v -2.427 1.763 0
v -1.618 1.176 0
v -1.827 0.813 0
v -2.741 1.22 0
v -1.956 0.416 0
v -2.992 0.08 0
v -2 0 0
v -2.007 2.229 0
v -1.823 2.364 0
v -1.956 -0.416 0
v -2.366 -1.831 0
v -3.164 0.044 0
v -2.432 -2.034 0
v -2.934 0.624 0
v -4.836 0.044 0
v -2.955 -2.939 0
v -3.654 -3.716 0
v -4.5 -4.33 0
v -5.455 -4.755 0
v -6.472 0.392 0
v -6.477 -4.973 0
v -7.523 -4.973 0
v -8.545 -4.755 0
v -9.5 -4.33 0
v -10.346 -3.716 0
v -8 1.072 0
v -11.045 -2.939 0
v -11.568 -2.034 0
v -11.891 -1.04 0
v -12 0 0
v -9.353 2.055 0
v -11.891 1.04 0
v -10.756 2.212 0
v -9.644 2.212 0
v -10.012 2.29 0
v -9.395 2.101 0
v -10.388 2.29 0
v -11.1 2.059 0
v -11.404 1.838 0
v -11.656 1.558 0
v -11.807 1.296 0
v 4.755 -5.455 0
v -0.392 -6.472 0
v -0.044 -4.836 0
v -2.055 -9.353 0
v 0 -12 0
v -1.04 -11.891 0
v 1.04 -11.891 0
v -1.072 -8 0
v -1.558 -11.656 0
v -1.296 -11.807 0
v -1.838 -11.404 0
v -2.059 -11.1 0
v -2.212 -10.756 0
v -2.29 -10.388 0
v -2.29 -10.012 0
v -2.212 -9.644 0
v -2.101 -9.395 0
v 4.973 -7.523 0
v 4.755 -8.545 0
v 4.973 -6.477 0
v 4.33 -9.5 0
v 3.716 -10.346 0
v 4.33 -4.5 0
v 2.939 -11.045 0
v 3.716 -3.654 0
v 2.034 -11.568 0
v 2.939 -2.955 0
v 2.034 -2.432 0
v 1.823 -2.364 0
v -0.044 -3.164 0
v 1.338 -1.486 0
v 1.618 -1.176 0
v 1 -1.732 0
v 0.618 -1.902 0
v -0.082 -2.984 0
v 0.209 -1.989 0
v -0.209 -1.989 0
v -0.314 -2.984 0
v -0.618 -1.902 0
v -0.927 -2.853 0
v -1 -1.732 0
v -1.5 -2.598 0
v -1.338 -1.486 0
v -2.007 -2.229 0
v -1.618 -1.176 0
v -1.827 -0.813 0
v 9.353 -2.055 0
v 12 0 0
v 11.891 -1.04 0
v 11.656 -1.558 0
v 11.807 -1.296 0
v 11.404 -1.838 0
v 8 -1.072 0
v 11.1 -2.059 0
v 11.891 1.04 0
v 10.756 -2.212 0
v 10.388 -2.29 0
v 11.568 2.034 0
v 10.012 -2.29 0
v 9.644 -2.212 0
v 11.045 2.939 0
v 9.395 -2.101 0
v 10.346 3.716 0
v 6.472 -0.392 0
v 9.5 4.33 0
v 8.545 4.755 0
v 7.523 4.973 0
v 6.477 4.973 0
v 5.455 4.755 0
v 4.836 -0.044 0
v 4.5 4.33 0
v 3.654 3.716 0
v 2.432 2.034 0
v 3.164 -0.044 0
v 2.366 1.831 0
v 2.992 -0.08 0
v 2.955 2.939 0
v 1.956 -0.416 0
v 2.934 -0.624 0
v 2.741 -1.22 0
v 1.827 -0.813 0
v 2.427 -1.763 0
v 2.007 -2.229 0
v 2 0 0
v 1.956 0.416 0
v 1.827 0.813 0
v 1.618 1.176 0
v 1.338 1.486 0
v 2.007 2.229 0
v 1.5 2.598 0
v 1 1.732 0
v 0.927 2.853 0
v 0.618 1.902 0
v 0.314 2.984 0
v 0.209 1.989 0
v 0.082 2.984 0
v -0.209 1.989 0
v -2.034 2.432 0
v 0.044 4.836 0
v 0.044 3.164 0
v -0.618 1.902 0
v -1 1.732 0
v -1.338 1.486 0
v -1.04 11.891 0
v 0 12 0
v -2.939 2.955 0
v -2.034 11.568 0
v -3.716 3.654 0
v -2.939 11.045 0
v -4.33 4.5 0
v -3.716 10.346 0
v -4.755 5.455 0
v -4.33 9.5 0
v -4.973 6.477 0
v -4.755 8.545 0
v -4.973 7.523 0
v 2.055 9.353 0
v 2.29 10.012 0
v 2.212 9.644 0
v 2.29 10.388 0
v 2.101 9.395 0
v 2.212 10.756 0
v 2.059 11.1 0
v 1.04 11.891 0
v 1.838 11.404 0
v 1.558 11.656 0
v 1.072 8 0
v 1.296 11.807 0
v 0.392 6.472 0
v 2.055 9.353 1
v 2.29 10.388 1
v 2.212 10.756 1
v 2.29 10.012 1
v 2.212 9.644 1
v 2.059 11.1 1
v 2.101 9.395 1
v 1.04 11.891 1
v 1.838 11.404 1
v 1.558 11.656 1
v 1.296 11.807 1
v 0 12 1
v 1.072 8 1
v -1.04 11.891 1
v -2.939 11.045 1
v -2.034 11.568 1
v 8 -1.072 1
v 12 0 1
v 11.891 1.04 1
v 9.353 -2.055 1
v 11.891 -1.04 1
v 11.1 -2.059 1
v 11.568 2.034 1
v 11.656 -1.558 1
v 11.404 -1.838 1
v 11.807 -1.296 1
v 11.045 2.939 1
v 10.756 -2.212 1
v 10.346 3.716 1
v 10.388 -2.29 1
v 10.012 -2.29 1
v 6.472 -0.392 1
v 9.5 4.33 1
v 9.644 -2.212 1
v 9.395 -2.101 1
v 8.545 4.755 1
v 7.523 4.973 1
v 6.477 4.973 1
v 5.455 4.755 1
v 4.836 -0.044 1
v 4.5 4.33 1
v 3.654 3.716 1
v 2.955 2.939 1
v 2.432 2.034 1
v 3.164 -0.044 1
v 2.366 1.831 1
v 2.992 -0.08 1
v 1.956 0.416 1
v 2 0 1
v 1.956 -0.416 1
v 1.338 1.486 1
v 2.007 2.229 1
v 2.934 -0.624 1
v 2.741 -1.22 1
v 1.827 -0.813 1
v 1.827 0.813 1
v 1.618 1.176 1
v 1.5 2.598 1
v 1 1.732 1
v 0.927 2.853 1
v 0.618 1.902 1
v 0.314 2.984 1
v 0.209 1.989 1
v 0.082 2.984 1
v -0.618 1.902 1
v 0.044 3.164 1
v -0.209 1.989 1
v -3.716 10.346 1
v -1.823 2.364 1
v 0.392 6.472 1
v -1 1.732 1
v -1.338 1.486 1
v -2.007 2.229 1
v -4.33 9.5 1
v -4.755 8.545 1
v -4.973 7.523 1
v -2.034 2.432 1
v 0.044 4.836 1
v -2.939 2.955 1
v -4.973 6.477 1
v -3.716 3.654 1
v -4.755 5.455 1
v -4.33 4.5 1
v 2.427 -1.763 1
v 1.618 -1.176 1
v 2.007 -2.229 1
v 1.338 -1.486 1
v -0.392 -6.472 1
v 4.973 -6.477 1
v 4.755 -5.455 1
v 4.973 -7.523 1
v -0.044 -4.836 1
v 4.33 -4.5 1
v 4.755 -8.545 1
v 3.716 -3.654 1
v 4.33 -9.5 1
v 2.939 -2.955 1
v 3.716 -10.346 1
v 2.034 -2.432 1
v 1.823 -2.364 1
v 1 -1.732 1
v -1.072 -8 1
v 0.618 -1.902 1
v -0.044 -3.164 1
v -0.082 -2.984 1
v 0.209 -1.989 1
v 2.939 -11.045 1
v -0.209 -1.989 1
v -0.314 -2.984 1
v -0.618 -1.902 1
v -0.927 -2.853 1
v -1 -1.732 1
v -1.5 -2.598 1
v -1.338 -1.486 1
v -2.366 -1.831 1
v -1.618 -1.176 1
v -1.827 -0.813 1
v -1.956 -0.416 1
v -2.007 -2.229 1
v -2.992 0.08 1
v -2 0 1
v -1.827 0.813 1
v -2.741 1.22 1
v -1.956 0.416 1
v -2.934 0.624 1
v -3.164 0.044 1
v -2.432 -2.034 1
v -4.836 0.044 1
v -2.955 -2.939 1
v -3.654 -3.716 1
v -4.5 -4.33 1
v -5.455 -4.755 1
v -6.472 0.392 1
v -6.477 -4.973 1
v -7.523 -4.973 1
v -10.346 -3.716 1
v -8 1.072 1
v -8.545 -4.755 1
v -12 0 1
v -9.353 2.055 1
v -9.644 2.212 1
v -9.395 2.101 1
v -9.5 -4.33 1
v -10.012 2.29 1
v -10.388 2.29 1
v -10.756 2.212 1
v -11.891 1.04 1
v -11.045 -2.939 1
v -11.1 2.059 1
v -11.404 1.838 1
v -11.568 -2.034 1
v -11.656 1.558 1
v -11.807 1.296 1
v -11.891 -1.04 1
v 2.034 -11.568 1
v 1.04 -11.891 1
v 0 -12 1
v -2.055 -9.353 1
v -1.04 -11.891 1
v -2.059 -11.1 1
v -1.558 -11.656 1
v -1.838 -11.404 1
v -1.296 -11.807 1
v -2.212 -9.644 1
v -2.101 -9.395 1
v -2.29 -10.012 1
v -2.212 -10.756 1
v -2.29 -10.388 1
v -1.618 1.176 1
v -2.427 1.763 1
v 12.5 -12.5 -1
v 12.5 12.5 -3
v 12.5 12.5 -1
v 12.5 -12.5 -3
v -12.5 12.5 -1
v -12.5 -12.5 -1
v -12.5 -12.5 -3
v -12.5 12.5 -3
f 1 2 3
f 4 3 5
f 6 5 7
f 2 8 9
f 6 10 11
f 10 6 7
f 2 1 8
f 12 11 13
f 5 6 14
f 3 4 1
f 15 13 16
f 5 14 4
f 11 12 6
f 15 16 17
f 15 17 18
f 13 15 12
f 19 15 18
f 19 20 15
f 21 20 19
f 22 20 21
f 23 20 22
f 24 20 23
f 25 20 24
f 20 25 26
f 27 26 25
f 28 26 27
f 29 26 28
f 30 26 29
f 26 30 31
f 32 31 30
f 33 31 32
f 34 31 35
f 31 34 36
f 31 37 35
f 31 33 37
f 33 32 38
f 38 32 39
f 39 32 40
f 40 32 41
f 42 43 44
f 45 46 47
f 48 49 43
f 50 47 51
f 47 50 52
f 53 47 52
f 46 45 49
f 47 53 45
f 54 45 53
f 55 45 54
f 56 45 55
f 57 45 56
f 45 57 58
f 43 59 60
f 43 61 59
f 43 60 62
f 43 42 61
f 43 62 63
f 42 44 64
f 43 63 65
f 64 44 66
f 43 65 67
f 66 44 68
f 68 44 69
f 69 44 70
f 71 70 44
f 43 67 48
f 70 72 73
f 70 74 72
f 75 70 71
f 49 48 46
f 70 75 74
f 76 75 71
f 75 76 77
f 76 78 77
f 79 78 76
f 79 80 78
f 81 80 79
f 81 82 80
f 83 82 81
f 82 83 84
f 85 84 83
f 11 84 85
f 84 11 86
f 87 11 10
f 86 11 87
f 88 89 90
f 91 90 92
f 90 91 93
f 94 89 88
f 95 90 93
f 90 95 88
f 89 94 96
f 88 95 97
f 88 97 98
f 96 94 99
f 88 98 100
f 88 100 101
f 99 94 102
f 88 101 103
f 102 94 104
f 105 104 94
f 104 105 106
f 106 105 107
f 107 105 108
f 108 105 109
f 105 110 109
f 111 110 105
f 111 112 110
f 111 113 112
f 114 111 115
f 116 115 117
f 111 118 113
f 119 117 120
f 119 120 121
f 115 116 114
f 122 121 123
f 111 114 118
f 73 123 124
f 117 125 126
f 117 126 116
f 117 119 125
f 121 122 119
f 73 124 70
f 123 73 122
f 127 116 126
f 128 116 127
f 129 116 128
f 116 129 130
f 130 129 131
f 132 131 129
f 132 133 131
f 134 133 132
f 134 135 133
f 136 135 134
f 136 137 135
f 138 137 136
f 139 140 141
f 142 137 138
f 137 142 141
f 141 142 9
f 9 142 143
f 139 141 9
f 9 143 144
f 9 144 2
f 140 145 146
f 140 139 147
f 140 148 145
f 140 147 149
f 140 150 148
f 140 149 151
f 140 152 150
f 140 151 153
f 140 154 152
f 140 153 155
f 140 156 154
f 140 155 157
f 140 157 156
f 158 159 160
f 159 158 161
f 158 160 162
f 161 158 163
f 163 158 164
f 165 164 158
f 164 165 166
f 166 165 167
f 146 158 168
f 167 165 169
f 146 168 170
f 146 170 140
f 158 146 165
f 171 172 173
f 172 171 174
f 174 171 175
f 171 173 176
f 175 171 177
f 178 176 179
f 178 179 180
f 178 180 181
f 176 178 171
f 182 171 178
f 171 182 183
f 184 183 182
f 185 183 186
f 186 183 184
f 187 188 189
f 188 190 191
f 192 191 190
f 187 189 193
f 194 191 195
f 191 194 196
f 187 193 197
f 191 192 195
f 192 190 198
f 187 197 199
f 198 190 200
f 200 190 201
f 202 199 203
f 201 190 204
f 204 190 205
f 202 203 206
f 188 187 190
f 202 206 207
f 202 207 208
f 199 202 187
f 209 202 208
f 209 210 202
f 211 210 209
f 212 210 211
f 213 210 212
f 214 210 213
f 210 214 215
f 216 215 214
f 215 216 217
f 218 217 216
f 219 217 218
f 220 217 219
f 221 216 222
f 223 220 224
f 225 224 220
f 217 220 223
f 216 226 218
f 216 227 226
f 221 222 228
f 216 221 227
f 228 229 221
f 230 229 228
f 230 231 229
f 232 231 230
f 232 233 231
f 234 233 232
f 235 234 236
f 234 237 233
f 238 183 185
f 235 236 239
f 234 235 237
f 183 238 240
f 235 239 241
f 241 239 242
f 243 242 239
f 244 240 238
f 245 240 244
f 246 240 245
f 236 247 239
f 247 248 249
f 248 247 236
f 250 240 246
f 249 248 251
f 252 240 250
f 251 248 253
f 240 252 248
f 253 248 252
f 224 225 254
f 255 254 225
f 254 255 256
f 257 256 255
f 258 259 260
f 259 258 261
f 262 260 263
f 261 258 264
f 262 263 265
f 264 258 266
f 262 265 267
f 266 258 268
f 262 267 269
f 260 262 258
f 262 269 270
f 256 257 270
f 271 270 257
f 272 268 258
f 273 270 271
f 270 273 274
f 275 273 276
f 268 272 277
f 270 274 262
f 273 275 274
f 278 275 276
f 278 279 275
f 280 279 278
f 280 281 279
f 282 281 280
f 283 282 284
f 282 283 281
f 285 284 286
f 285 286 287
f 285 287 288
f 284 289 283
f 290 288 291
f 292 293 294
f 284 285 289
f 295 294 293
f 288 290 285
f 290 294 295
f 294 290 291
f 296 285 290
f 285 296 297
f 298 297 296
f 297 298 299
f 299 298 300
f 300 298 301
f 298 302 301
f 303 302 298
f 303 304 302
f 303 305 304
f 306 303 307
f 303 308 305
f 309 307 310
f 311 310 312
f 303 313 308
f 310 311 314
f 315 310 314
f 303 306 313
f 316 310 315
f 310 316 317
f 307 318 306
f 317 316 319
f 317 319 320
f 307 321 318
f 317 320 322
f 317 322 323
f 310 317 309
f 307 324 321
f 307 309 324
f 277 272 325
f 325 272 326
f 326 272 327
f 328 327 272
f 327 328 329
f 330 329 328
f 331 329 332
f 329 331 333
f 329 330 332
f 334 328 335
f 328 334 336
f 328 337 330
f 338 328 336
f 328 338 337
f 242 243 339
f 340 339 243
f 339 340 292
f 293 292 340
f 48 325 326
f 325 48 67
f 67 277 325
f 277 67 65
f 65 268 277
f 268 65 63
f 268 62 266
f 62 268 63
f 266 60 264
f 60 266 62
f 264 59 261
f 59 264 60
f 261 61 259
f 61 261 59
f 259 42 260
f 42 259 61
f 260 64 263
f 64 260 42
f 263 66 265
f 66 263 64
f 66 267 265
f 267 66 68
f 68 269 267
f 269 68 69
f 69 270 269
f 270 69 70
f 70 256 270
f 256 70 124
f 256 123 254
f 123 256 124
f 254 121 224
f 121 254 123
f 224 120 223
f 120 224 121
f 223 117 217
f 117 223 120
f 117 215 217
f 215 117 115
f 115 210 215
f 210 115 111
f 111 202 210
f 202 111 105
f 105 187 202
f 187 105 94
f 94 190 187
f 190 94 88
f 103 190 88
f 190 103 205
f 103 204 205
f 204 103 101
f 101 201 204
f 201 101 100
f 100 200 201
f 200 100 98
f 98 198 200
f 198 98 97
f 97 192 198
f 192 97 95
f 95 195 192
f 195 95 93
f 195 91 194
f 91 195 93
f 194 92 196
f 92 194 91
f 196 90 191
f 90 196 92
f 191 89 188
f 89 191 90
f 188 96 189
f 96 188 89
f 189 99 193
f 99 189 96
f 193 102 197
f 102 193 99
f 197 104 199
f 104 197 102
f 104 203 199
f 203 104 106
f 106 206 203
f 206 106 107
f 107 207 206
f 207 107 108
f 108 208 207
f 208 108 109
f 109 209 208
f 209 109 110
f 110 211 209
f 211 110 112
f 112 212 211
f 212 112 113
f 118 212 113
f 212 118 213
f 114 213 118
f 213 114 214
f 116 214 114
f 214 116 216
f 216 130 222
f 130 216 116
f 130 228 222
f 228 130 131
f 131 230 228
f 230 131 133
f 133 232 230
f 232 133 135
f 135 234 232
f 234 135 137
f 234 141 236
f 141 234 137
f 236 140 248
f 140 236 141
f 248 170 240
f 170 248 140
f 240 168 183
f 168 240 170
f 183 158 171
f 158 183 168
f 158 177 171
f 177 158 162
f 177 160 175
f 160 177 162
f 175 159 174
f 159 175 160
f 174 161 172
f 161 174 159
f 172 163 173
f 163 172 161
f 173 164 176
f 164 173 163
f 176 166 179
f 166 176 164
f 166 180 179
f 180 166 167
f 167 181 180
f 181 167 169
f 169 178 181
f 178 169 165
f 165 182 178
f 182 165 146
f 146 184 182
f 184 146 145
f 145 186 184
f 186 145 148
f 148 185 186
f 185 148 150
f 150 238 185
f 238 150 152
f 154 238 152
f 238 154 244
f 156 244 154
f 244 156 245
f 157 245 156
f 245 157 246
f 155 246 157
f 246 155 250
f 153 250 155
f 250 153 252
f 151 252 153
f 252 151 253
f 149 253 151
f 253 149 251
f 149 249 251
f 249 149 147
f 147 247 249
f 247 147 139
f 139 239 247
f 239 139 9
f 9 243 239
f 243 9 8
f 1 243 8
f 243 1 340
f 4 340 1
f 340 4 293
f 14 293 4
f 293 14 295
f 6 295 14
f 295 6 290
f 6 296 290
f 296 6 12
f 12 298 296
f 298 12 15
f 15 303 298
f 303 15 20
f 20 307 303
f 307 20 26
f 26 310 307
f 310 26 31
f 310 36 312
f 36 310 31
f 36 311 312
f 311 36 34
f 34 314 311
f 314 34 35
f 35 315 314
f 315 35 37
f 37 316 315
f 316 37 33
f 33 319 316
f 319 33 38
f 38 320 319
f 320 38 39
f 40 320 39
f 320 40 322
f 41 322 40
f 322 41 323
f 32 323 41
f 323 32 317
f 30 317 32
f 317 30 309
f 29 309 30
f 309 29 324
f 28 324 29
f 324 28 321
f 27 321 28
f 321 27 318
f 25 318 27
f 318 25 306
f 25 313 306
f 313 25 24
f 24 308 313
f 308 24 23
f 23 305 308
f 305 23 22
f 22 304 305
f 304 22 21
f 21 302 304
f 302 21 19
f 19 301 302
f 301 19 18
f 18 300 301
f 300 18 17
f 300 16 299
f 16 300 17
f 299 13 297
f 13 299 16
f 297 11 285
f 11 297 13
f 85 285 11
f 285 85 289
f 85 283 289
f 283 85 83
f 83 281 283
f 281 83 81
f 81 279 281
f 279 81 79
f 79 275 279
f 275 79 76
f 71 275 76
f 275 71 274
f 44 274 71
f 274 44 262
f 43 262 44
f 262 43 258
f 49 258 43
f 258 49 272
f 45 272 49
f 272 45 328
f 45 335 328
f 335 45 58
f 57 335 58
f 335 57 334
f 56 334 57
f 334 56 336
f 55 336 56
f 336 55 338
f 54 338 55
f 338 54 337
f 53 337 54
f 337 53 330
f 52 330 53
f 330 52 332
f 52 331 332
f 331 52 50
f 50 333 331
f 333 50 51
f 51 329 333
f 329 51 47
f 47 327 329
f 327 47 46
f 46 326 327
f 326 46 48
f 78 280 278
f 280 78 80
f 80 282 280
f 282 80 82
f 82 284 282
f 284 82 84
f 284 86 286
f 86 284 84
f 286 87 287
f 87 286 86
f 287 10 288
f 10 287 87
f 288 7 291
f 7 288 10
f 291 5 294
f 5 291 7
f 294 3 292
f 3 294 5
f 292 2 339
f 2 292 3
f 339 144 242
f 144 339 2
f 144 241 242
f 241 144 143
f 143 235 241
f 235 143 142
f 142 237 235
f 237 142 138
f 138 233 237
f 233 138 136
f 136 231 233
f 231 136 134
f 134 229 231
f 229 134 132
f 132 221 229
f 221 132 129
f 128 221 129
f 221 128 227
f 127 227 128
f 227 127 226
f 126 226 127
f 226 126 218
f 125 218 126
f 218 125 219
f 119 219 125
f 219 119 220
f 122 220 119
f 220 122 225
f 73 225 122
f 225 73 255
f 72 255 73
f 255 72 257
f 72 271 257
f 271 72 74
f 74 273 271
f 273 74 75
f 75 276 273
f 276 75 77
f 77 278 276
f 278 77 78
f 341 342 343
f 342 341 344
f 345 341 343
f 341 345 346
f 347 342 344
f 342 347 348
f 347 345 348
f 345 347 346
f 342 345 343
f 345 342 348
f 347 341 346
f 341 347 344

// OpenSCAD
// file: iso-7000-fan.scad
/**
 https://blog.adafruit.com/2017/04/21/view-all-the-iso-7000-iec-60417-graphical-symbols-for-use-on-equipment/

 https://www.iso.org/obp/ui/#iso:pub:PUB400008:en

 https://www.iso.org/obp/ui/#iso:grs:7000:0089
*/

module fan(height=1)
{
    linear_extrude(height=height)
    fan2D();
}

module fan2D()
{
    union()
    {
        fanHub();
        
        fanBlades();
    }
}

module fanBlade()
{
    difference()
    {
        fanBladePartA();

        translate([0, 4.5, 0])
        fanBladePartB();
    }
}

module fanBlades()
{
    for(i = [0 : 3])
    {
//        echo(i);
        
        rotate([0,0,i*90])
        translate([7,0,0])
        
        fanBlade();
    }
}

/**
 * This is the first part of the fan blade.  it only has circle with the main 'u' 
 * shape cut out.
 */
module fanBladePartA()
{
    difference()
    {        
        circle(r=5, $fn=30);
        
        translate([-3, -8,0])
        circle(r = 8, $fn=30);
    }    
}

/**
 * This part is the cutout for the right side round end
 */
module fanBladePartB()
{
    difference()
    {
        translate([2, -10, 0])
        square([3,5]);

        translate([3.2, -5, 0])
        circle(r=1.8, $fn=30);
    }    
}

module fanHub()
{
    difference()
    {
        circle(r=3, $fn=30);
        
        circle(r=2, $fn=30);
    }
}

module fanThumbnail()
{
    fan(height=1);
}
// file: ../../external-resources/thumbnail-background.scad
module thumbnailBackground()
{
	color("green")
	translate([0, 0, -2])
	cube([25, 25, 2], center=true);	
}
// main file
use <../../external-resources/thumbnail-background.scad>
use <iso-7000-fan.scad>

fanThumbnail();
thumbnailBackground();
